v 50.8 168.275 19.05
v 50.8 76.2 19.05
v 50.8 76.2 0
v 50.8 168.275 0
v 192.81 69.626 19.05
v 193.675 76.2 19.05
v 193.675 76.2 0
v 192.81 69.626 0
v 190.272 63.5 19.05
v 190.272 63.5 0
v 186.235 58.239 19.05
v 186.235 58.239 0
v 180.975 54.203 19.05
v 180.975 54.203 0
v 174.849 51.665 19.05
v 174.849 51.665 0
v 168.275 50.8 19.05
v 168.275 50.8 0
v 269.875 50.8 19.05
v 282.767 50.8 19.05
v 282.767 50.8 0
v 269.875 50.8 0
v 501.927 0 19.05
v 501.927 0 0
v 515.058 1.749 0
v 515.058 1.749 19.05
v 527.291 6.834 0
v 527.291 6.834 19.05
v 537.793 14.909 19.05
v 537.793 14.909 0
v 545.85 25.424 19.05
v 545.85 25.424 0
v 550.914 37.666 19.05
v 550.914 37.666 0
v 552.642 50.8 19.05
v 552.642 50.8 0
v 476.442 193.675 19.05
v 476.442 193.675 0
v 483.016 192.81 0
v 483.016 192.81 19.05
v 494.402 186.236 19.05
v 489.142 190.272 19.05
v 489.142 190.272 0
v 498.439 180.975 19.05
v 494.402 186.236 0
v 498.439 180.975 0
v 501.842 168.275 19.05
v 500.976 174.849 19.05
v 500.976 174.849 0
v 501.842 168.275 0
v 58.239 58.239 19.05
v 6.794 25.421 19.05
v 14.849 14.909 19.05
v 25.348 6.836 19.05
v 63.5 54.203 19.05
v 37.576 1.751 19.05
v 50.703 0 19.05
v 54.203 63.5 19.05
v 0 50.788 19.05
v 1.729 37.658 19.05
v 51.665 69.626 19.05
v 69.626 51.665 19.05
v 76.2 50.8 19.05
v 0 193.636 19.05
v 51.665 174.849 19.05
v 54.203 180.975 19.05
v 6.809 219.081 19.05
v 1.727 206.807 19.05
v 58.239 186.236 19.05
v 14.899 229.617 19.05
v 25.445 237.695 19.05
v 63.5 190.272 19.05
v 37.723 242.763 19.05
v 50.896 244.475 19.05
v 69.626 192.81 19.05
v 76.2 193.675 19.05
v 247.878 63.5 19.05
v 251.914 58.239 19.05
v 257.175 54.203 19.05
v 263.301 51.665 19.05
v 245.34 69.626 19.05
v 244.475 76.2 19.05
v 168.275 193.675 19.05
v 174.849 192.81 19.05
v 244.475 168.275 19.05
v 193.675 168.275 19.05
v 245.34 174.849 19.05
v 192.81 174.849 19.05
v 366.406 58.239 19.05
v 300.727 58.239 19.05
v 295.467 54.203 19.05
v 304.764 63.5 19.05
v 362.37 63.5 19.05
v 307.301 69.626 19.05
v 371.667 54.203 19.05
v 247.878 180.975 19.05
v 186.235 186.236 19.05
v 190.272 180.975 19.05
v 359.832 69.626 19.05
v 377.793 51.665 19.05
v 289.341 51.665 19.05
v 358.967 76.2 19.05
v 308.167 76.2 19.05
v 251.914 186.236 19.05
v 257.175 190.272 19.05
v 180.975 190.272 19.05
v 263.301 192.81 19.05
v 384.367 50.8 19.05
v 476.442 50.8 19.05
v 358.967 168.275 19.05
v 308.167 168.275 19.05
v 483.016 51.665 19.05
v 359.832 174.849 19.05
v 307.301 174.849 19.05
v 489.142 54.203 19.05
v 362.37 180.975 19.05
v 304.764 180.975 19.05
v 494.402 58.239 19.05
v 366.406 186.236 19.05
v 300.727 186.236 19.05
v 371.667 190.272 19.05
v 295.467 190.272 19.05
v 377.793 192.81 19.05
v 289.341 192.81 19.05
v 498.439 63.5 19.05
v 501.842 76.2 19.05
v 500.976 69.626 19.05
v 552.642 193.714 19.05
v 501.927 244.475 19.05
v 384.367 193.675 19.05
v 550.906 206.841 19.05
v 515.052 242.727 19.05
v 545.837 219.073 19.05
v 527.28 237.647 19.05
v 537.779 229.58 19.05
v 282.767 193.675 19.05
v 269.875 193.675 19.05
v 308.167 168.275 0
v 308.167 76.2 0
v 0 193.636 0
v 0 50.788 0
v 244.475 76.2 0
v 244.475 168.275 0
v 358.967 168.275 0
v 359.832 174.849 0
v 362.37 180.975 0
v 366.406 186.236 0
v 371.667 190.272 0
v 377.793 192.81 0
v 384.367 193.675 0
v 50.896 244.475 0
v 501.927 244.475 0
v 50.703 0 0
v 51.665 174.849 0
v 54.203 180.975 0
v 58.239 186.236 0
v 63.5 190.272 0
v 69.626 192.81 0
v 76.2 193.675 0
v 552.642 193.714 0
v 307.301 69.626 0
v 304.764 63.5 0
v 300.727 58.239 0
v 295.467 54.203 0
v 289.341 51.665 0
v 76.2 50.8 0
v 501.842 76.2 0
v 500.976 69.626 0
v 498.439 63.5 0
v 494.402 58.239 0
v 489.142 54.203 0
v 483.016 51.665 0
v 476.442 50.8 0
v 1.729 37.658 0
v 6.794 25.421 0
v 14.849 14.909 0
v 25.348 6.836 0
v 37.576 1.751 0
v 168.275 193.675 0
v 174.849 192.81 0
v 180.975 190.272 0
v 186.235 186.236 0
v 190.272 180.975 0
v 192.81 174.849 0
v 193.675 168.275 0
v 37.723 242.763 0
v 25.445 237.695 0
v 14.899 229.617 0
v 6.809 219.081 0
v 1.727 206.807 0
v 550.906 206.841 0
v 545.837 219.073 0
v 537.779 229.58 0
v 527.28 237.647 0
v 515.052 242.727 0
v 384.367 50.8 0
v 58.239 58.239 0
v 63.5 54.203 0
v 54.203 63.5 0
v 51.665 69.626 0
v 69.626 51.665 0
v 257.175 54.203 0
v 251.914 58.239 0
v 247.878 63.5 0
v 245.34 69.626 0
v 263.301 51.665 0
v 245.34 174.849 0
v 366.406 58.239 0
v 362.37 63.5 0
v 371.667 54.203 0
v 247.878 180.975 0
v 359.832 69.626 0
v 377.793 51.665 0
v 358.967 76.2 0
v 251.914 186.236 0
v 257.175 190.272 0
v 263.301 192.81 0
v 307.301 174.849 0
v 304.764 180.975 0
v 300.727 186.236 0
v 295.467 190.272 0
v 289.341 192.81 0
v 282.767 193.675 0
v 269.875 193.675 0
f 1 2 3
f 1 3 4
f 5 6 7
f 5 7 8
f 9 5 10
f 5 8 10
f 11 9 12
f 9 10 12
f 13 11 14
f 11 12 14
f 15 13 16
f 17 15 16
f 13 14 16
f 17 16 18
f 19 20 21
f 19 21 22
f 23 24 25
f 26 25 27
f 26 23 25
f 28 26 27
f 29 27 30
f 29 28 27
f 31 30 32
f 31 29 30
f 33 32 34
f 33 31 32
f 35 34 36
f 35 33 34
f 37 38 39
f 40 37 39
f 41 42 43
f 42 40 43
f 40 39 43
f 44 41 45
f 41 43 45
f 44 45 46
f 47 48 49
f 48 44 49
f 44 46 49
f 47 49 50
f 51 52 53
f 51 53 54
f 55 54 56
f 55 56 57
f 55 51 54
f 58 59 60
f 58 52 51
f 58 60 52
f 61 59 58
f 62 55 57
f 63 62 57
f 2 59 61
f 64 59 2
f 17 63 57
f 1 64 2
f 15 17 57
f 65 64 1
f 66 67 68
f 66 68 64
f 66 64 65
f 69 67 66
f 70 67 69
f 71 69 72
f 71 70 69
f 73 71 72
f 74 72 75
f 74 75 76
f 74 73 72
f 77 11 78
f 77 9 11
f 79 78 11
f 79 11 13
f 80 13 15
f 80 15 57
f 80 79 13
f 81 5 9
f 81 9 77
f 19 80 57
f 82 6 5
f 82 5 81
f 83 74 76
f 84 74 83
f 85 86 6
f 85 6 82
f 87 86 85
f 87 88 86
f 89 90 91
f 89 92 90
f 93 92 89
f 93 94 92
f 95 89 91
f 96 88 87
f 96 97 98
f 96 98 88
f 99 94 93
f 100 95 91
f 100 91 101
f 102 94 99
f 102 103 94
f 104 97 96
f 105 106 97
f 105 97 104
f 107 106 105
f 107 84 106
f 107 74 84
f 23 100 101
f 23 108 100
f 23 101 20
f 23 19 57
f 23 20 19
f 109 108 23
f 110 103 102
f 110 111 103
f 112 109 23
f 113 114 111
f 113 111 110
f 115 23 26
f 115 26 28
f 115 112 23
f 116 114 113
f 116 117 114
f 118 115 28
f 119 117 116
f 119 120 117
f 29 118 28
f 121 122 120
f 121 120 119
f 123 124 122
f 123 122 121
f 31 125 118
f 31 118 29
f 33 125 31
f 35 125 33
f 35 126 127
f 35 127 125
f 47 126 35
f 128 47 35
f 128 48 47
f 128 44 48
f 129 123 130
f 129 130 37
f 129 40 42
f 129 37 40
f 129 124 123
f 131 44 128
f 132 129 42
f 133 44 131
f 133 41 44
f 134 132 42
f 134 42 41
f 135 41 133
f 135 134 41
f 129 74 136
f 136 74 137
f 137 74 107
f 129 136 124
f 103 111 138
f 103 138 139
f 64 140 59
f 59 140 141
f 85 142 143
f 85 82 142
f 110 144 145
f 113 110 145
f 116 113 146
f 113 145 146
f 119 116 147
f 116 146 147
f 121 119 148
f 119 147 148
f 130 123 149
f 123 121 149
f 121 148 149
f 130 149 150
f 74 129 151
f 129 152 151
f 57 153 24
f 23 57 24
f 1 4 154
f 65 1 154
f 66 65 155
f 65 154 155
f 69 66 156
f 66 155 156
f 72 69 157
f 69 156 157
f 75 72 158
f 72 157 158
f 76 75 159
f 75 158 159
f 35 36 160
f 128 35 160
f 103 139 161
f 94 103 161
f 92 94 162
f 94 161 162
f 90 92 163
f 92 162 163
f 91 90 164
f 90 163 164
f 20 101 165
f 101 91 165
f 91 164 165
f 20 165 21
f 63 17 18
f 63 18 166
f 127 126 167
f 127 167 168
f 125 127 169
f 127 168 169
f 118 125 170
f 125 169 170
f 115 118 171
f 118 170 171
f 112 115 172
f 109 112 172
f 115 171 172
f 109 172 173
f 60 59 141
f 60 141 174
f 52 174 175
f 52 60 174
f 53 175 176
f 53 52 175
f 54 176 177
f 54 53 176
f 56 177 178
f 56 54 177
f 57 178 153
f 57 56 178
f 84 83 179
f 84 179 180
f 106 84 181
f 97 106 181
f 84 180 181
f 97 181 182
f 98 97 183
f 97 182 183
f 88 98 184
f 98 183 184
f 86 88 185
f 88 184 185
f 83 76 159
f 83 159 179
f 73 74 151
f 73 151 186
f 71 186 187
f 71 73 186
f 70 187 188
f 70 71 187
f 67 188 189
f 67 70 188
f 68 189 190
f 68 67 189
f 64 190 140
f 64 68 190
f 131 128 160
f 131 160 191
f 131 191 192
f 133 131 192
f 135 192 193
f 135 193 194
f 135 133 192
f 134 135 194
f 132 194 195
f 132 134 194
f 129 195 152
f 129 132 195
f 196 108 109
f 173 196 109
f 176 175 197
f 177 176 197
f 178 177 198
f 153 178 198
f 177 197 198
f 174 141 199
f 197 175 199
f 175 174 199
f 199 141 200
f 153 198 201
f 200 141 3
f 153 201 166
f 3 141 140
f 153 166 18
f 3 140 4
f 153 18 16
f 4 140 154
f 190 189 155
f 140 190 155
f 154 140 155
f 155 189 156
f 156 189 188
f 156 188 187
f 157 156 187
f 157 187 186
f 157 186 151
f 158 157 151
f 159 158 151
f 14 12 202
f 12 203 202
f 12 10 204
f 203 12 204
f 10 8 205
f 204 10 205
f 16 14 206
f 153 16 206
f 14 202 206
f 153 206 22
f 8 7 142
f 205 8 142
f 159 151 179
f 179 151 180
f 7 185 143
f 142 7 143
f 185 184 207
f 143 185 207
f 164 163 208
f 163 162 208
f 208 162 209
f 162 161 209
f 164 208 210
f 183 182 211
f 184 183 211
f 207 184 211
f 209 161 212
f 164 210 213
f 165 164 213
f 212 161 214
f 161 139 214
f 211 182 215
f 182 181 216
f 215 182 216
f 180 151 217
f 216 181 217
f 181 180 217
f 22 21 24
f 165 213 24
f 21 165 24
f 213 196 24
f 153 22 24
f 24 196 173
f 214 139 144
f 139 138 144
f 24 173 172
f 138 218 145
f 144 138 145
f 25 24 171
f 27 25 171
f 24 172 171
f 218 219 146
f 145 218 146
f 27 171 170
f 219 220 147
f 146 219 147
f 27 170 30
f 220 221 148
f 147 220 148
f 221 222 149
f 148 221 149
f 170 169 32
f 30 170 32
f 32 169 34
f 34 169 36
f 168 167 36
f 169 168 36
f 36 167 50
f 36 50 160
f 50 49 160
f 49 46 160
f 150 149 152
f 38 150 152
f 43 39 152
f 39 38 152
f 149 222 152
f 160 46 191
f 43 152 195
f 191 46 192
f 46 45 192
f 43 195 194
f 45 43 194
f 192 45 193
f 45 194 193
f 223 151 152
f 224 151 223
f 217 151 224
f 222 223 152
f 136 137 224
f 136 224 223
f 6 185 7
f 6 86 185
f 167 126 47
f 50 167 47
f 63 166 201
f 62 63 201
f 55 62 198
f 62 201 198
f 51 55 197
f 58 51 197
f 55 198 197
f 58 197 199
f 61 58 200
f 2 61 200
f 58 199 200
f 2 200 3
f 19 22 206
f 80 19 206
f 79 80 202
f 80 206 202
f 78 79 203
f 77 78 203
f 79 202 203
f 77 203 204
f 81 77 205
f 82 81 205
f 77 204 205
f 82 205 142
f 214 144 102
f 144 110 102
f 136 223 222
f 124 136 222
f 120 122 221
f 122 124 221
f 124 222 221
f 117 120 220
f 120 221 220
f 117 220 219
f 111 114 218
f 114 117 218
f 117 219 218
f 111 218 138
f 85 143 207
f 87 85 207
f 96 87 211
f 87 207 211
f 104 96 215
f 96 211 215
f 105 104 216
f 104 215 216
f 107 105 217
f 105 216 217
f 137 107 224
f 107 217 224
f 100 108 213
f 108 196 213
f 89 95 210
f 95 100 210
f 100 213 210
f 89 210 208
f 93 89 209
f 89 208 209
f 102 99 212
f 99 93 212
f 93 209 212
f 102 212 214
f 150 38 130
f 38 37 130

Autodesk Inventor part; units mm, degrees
ref_plane "YZ Plane" through (0, 0, 0) normal (1, 0, 0) x (0, 1, 0)
ref_plane "XZ Plane" through (0, 0, 0) normal (0, 1, 0) x (-1, 0, 0)
ref_plane "XY Plane" through (0, 0, 0) normal (0, 0, 1) x (1, 0, 0)
sketch "Sketch2" plane through (0, 0, 0) normal (0, 0, 1) x (1, 0, 0)
  line L0 (0, 0) -> (552.641777, 0)
  line L1 (552.641777, 0) -> (552.641777, 244.475)
  line L2 (552.641777, 244.475) -> (0, 244.475)
  line L3 (0, 244.475) -> (0, 0)
  dimension "d6" = 244.475
extrude "Extrusion1" add sketch "Sketch2" along normal blind 19.05
sketch "Sketch3" plane through (0, 0, 19.05) normal (0, 0, 1) x (1, 0, 0)
  line L0 (0, 0) -> (552.641777, 0)
  line L1 (552.641777, 0) -> (552.641777, 244.475)
  line L2 (552.641777, 244.475) -> (0, 244.475)
  line L3 (0, 244.475) -> (0, 0)
  arc A0 (50.896482, 244.475) -> (0, 193.636302) centre (50.799985, 193.675092) ccw
  dimension "d9" = 50.8
sketch "Sketch3 outline for Extrusion2" plane through (0, 0, 19.05) normal (0, 0, 1) x (1, 0, 0)
  arc A0 (50.896482, 244.475) -> (0, 193.636302) centre (50.799985, 193.675092) ccw
  line L0 (0, 244.475) -> (0, 193.636302)
  line L1 (50.896482, 244.475) -> (0, 244.475)
extrude "Extrusion2" cut sketch "Sketch3 outline for Extrusion2" against normal blind 19.05
sketch "Sketch4" plane through (0, 0, 19.05) normal (0, 0, 1) x (1, 0, 0)
  line L0 (0, 193.713882) -> (0, 0)
  line L1 (0, 0) -> (552.641777, 0)
  line L2 (552.641777, 0) -> (552.641777, 244.475)
  line L3 (552.641777, 244.475) -> (50.703488, 244.475)
  arc A0 (552.641777, 193.713882) -> (500.210663, 244.475) centre (501.841779, 193.701193) ccw
  arc A1 (501.841779, 0) -> (552.641777, 50.788429) centre (501.841778, 50.8) ccw
  arc A2 (0, 50.788429) -> (50.703488, 0) centre (50.799999, 50.799908) ccw
  dimension "d15" = 50.8
  dimension "d16" = 50.8
  dimension "d17" = 50.8
extrude "Extrusion3" cut sketch "Sketch4" against normal blind 19.05 contours A2 L1 L0
sketch "Sketch5" plane through (0, 0, 19.05) normal (0, 0, 1) x (1, 0, 0)
  line L0 (552.641777, 0) -> (552.641777, 244.475)
  line L1 (552.641777, 244.475) -> (50.703488, 244.475)
  arc A0 (552.641777, 193.713882) -> (501.92669, 244.475) centre (501.841792, 193.675071) ccw
  point P0 (0, 0)
  dimension "d20" = 50.8
extrude "Extrusion4" cut sketch "Sketch5" against normal blind 19.05
sketch "Sketch6" plane through (0, 0, 19.05) normal (0, 0, 1) x (1, 0, 0)
  line L0 (50.703488, 0) -> (552.641777, 0)
  line L1 (552.641777, 0) -> (552.641777, 193.713882)
  arc A0 (501.92669, 0) -> (552.641777, 50.799908) centre (501.841777, 50.799929) ccw
  point P0 (0, 0)
  dimension "d23" = 50.8
extrude "Extrusion5" cut sketch "Sketch6" against normal blind 19.05
sketch "Sketch7" plane through (0, 0, 19.05) normal (0, 0, 1) x (1, 0, 0)
  arc A0 (552.641777, 193.713882) -> (501.92669, 244.475) centre (501.841792, 193.675071) ccw
  arc A1 (50.703488, 244.475) -> (0, 193.713882) centre (50.799985, 193.675092) ccw
  line L0 (50.799985, 193.675092) -> (193.674985, 193.675092)
  line L1 (193.674985, 193.675092) -> (193.674985, 50.799908)
  line L2 (193.674985, 50.799908) -> (50.799985, 50.799908)
  line L3 (50.799985, 50.799908) -> (50.799985, 193.675092)
  line L4 (501.841792, 193.675071) -> (358.966792, 193.675071)
  line L5 (358.966792, 193.675071) -> (358.966792, 50.799908)
  line L6 (358.966792, 50.799908) -> (501.841792, 50.799908)
  line L7 (501.841792, 50.799908) -> (501.841792, 193.675071)
  point P0 (0, 0)
  dimension "d26" = 142.875
  dimension "d27" = 142.875
extrude "Extrusion6" cut sketch "Sketch7" against normal blind 19.05 contours L0 L1 L2 L3
sketch "Sketch8" plane through (0, 0, 19.05) normal (0, 0, 1) x (1, 0, 0)
  arc A0 (552.641777, 193.713882) -> (501.92669, 244.475) centre (501.841792, 193.675071) ccw
  line L0 (501.841792, 193.675071) -> (358.966792, 193.675071)
  line L1 (358.966792, 193.675071) -> (358.966792, 50.799908)
  line L2 (358.966792, 50.799908) -> (501.841792, 50.799908)
  line L3 (501.841792, 50.799908) -> (501.841792, 193.675071)
  point P0 (0, 0)
  dimension "d30" = 142.875
extrude "Extrusion7" cut sketch "Sketch8" against normal blind 19.05
sketch "Sketch9" plane through (0, 0, 19.05) normal (0, 0, 1) x (1, 0, 0)
  line L0 (244.474985, 193.675092) -> (308.166792, 193.675092)
  line L1 (308.166792, 193.675092) -> (308.166792, 50.799908)
  line L2 (308.166792, 50.799908) -> (244.474985, 50.799908)
  line L3 (244.474985, 50.799908) -> (244.474985, 193.675092)
  point P0 (193.674985, 193.675092)
  point P1 (0, 0)
  dimension "d33" = 50.8
extrude "Extrusion8" cut sketch "Sketch9" against normal blind 19.05
fillet "Fillet1" radius 25.4 1 edges at (50.8, 193.6751, 9.525)
fillet "Fillet2" radius 25.4 1 edges at (193.675, 193.6751, 9.525)
fillet "Fillet3" radius 25.4 1 edges at (308.1668, 193.6751, 9.525)
fillet "Fillet4" radius 25.4 1 edges at (501.8418, 193.6751, 9.525)
fillet "Fillet5" radius 25.4 1 edges at (501.8418, 50.7999, 9.525)
fillet "Fillet6" radius 25.4 1 edges at (358.9668, 193.6751, 9.525)
fillet "Fillet7" radius 25.4 1 edges at (358.9668, 50.7999, 9.525)
fillet "Fillet8" radius 25.4 1 edges at (244.475, 50.7999, 9.525)
fillet "Fillet9" radius 25.4 1 edges at (244.475, 193.6751, 9.525)
fillet "Fillet10" radius 25.4 1 edges at (193.675, 50.7999, 9.525)
fillet "Fillet11" radius 25.4 1 edges at (308.1668, 50.7999, 9.525)
fillet "Fillet12" radius 25.4 1 edges at (50.8, 50.7999, 9.525)
properties part number "ROV-Side Panel" material "Acetal Resin, Black"
